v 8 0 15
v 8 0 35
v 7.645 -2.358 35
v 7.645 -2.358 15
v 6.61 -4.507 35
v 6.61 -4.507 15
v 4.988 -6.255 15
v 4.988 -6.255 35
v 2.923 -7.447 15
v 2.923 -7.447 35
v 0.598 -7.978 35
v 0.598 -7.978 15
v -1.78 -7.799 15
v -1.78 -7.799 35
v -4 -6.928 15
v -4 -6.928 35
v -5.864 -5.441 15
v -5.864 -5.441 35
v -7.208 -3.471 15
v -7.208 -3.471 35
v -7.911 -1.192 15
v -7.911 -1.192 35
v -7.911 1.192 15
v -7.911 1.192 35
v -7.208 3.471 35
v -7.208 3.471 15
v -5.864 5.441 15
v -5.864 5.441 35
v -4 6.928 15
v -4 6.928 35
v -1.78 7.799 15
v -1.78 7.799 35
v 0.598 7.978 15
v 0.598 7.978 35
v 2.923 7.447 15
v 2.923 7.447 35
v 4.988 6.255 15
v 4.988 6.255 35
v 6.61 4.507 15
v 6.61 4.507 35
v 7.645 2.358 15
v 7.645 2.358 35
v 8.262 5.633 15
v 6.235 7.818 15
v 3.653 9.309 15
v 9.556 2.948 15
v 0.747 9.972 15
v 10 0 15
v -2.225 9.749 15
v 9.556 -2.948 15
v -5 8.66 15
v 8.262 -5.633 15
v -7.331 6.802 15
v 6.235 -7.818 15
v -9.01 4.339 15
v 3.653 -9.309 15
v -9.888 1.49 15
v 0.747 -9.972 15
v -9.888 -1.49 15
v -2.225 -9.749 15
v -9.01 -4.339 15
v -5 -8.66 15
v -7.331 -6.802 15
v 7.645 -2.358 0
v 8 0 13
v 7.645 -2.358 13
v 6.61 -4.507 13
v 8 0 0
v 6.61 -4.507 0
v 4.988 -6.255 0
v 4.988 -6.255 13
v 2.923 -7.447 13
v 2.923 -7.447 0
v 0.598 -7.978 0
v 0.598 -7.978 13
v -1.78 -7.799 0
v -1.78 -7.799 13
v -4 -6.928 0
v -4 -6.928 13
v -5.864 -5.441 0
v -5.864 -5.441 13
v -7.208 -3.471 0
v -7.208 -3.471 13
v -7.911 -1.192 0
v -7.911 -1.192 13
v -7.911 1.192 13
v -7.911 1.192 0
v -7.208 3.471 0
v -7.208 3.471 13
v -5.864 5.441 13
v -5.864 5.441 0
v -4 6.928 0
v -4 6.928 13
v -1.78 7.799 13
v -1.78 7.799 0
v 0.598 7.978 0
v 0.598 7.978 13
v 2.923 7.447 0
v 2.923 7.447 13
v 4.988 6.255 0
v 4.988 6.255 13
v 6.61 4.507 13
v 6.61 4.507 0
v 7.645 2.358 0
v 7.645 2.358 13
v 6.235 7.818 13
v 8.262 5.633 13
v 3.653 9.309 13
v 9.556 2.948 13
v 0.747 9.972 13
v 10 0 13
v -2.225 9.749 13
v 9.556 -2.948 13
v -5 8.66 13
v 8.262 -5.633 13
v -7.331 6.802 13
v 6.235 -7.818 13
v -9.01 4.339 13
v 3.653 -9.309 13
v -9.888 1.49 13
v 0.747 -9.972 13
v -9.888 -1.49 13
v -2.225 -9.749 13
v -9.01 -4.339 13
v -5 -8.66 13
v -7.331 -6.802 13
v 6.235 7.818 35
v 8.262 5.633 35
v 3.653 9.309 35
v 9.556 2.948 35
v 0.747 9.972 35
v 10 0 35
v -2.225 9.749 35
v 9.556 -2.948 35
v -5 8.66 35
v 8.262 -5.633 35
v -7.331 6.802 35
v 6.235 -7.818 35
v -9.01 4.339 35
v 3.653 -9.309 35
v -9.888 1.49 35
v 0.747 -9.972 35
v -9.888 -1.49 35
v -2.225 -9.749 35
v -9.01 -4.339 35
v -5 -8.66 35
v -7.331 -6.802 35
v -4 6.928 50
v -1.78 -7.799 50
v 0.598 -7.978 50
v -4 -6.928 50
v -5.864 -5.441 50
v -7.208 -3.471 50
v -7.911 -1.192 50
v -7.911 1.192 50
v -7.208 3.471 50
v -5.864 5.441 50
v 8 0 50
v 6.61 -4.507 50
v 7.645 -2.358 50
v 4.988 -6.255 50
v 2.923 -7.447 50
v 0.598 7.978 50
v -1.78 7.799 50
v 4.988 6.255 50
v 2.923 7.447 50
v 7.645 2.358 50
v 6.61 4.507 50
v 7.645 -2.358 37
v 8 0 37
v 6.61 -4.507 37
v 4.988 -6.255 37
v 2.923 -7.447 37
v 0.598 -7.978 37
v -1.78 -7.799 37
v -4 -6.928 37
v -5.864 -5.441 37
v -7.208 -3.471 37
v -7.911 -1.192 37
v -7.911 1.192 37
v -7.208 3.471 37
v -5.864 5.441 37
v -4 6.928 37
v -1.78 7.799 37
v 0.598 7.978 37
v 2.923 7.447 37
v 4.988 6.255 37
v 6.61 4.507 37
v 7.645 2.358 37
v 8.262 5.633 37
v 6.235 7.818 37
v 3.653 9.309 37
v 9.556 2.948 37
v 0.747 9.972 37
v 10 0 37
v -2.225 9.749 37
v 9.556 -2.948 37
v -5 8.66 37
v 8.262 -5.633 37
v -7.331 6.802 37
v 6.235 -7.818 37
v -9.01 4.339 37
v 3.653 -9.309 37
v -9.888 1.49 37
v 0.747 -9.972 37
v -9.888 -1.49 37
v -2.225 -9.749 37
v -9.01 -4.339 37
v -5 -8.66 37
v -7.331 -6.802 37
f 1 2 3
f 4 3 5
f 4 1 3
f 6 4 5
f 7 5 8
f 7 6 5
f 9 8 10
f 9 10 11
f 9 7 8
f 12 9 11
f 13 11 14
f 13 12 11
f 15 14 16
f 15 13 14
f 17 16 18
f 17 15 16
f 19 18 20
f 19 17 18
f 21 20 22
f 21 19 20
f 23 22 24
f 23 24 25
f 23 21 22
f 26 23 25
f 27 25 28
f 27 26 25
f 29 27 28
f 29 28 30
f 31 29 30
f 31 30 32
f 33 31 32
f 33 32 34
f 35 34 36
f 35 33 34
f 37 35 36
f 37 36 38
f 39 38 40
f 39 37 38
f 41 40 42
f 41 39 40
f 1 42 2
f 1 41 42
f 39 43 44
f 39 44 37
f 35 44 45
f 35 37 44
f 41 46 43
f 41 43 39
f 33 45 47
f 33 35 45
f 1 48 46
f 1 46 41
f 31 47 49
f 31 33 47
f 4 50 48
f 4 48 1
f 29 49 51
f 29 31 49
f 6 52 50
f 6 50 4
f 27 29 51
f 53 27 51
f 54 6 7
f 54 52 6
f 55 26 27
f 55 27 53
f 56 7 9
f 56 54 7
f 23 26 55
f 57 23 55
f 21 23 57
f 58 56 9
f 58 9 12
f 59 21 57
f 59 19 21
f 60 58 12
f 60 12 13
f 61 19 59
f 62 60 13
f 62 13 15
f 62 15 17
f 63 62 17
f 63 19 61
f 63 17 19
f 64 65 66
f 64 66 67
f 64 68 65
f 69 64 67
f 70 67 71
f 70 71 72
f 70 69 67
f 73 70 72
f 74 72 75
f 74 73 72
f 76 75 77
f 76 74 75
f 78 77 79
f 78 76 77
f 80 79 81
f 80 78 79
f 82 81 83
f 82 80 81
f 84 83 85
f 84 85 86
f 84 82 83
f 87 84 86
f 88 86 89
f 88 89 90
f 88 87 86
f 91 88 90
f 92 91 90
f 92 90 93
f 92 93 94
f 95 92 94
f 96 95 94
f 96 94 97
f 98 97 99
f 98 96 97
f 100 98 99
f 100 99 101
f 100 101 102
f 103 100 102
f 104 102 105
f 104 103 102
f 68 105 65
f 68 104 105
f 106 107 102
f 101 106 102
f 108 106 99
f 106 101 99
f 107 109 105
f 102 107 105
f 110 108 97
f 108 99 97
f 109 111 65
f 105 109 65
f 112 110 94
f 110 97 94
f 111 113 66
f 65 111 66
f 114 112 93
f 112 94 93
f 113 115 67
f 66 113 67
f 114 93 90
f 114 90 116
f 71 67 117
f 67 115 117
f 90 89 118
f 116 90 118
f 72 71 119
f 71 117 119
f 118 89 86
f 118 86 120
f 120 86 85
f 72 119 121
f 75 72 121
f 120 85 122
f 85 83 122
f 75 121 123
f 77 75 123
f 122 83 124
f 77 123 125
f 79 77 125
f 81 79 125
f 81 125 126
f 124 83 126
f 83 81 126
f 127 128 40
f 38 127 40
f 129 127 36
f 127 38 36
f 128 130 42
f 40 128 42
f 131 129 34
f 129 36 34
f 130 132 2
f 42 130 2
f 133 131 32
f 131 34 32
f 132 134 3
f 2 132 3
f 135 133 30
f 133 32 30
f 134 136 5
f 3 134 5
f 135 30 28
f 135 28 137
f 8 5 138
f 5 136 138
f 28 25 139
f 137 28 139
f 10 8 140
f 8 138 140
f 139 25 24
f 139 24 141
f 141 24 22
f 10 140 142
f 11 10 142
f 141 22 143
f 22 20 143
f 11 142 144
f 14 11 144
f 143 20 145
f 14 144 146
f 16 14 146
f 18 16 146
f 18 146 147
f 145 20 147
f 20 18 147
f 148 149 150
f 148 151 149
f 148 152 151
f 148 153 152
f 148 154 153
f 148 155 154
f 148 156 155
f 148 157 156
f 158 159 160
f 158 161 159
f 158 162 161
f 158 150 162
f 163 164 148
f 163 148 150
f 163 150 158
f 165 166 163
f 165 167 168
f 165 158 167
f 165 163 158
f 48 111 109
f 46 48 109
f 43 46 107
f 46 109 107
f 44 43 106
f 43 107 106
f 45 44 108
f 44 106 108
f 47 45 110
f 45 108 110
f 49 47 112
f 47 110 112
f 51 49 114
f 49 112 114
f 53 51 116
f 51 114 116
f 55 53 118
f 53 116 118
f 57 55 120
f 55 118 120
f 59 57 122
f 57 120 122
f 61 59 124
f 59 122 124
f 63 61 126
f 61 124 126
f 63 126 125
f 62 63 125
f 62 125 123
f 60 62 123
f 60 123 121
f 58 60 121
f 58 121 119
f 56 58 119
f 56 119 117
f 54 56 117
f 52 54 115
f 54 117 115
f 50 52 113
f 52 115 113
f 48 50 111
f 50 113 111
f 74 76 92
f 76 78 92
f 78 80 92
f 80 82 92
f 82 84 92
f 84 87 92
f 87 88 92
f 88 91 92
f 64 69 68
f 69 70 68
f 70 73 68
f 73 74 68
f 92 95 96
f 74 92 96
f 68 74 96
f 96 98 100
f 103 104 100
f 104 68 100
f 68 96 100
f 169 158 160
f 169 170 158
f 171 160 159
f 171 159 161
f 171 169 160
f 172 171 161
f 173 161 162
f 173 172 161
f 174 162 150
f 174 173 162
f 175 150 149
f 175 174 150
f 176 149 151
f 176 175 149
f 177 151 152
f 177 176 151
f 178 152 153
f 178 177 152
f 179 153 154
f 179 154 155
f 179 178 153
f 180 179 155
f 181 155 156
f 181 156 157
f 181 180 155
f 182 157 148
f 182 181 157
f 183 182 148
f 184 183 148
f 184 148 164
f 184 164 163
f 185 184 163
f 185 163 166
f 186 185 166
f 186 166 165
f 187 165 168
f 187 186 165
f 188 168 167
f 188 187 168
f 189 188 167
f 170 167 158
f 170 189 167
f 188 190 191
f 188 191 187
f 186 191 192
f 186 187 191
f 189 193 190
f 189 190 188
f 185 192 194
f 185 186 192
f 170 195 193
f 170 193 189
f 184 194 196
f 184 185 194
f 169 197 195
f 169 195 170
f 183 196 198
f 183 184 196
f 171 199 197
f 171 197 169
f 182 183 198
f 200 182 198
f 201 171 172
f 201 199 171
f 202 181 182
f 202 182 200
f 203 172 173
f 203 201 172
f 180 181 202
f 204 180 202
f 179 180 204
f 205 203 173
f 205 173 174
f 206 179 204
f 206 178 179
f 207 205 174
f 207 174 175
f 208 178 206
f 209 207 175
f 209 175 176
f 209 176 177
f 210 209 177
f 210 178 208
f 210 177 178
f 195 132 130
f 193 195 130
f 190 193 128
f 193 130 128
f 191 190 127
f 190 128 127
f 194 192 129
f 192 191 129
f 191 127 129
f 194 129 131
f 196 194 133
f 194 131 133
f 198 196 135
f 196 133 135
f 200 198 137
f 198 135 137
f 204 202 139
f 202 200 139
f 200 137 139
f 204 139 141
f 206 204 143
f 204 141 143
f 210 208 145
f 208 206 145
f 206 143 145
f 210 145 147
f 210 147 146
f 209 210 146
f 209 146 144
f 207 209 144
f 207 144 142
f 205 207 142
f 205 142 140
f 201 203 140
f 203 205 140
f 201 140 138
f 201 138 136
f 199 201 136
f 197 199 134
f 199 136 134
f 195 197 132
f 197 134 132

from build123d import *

# Parameters (mm, degrees)
SKETCH1_R           = 10
BOSS_EXTRUDE1_DEPTH = 50
SKETCH2_W           = 13
SKETCH2_H           = 2
SKETCH2_W_2         = 20


with BuildPart() as part:
    # Sketch1 → Boss-Extrude1 (new body)
    with BuildSketch(Plane.XY):
        Circle(SKETCH1_R)
    extrude(amount=BOSS_EXTRUDE1_DEPTH)

    # Sketch2 → Cut-Revolve1 (revolve, cut)
    with BuildSketch(Plane(origin=(0, 0, 0), x_dir=(0, 0, -1), z_dir=(1, 0, 0)), mode=Mode.PRIVATE) as cut_revolve1_sk:
        with Locations((-43.5, 9)):
            Rectangle(SKETCH2_W, SKETCH2_H)
        with Locations((-25, 9)):
            Rectangle(SKETCH2_W_2, SKETCH2_H)
        with Locations((-6.5, 9)):
            Rectangle(SKETCH2_W, SKETCH2_H)
    revolve(cut_revolve1_sk.sketch.rotate(Axis((0, 0, 25), (0, 0, -1)), 90), axis=Axis((0, 0, 25), (0, 0, -1)), mode=Mode.SUBTRACT)


solid = part.part
